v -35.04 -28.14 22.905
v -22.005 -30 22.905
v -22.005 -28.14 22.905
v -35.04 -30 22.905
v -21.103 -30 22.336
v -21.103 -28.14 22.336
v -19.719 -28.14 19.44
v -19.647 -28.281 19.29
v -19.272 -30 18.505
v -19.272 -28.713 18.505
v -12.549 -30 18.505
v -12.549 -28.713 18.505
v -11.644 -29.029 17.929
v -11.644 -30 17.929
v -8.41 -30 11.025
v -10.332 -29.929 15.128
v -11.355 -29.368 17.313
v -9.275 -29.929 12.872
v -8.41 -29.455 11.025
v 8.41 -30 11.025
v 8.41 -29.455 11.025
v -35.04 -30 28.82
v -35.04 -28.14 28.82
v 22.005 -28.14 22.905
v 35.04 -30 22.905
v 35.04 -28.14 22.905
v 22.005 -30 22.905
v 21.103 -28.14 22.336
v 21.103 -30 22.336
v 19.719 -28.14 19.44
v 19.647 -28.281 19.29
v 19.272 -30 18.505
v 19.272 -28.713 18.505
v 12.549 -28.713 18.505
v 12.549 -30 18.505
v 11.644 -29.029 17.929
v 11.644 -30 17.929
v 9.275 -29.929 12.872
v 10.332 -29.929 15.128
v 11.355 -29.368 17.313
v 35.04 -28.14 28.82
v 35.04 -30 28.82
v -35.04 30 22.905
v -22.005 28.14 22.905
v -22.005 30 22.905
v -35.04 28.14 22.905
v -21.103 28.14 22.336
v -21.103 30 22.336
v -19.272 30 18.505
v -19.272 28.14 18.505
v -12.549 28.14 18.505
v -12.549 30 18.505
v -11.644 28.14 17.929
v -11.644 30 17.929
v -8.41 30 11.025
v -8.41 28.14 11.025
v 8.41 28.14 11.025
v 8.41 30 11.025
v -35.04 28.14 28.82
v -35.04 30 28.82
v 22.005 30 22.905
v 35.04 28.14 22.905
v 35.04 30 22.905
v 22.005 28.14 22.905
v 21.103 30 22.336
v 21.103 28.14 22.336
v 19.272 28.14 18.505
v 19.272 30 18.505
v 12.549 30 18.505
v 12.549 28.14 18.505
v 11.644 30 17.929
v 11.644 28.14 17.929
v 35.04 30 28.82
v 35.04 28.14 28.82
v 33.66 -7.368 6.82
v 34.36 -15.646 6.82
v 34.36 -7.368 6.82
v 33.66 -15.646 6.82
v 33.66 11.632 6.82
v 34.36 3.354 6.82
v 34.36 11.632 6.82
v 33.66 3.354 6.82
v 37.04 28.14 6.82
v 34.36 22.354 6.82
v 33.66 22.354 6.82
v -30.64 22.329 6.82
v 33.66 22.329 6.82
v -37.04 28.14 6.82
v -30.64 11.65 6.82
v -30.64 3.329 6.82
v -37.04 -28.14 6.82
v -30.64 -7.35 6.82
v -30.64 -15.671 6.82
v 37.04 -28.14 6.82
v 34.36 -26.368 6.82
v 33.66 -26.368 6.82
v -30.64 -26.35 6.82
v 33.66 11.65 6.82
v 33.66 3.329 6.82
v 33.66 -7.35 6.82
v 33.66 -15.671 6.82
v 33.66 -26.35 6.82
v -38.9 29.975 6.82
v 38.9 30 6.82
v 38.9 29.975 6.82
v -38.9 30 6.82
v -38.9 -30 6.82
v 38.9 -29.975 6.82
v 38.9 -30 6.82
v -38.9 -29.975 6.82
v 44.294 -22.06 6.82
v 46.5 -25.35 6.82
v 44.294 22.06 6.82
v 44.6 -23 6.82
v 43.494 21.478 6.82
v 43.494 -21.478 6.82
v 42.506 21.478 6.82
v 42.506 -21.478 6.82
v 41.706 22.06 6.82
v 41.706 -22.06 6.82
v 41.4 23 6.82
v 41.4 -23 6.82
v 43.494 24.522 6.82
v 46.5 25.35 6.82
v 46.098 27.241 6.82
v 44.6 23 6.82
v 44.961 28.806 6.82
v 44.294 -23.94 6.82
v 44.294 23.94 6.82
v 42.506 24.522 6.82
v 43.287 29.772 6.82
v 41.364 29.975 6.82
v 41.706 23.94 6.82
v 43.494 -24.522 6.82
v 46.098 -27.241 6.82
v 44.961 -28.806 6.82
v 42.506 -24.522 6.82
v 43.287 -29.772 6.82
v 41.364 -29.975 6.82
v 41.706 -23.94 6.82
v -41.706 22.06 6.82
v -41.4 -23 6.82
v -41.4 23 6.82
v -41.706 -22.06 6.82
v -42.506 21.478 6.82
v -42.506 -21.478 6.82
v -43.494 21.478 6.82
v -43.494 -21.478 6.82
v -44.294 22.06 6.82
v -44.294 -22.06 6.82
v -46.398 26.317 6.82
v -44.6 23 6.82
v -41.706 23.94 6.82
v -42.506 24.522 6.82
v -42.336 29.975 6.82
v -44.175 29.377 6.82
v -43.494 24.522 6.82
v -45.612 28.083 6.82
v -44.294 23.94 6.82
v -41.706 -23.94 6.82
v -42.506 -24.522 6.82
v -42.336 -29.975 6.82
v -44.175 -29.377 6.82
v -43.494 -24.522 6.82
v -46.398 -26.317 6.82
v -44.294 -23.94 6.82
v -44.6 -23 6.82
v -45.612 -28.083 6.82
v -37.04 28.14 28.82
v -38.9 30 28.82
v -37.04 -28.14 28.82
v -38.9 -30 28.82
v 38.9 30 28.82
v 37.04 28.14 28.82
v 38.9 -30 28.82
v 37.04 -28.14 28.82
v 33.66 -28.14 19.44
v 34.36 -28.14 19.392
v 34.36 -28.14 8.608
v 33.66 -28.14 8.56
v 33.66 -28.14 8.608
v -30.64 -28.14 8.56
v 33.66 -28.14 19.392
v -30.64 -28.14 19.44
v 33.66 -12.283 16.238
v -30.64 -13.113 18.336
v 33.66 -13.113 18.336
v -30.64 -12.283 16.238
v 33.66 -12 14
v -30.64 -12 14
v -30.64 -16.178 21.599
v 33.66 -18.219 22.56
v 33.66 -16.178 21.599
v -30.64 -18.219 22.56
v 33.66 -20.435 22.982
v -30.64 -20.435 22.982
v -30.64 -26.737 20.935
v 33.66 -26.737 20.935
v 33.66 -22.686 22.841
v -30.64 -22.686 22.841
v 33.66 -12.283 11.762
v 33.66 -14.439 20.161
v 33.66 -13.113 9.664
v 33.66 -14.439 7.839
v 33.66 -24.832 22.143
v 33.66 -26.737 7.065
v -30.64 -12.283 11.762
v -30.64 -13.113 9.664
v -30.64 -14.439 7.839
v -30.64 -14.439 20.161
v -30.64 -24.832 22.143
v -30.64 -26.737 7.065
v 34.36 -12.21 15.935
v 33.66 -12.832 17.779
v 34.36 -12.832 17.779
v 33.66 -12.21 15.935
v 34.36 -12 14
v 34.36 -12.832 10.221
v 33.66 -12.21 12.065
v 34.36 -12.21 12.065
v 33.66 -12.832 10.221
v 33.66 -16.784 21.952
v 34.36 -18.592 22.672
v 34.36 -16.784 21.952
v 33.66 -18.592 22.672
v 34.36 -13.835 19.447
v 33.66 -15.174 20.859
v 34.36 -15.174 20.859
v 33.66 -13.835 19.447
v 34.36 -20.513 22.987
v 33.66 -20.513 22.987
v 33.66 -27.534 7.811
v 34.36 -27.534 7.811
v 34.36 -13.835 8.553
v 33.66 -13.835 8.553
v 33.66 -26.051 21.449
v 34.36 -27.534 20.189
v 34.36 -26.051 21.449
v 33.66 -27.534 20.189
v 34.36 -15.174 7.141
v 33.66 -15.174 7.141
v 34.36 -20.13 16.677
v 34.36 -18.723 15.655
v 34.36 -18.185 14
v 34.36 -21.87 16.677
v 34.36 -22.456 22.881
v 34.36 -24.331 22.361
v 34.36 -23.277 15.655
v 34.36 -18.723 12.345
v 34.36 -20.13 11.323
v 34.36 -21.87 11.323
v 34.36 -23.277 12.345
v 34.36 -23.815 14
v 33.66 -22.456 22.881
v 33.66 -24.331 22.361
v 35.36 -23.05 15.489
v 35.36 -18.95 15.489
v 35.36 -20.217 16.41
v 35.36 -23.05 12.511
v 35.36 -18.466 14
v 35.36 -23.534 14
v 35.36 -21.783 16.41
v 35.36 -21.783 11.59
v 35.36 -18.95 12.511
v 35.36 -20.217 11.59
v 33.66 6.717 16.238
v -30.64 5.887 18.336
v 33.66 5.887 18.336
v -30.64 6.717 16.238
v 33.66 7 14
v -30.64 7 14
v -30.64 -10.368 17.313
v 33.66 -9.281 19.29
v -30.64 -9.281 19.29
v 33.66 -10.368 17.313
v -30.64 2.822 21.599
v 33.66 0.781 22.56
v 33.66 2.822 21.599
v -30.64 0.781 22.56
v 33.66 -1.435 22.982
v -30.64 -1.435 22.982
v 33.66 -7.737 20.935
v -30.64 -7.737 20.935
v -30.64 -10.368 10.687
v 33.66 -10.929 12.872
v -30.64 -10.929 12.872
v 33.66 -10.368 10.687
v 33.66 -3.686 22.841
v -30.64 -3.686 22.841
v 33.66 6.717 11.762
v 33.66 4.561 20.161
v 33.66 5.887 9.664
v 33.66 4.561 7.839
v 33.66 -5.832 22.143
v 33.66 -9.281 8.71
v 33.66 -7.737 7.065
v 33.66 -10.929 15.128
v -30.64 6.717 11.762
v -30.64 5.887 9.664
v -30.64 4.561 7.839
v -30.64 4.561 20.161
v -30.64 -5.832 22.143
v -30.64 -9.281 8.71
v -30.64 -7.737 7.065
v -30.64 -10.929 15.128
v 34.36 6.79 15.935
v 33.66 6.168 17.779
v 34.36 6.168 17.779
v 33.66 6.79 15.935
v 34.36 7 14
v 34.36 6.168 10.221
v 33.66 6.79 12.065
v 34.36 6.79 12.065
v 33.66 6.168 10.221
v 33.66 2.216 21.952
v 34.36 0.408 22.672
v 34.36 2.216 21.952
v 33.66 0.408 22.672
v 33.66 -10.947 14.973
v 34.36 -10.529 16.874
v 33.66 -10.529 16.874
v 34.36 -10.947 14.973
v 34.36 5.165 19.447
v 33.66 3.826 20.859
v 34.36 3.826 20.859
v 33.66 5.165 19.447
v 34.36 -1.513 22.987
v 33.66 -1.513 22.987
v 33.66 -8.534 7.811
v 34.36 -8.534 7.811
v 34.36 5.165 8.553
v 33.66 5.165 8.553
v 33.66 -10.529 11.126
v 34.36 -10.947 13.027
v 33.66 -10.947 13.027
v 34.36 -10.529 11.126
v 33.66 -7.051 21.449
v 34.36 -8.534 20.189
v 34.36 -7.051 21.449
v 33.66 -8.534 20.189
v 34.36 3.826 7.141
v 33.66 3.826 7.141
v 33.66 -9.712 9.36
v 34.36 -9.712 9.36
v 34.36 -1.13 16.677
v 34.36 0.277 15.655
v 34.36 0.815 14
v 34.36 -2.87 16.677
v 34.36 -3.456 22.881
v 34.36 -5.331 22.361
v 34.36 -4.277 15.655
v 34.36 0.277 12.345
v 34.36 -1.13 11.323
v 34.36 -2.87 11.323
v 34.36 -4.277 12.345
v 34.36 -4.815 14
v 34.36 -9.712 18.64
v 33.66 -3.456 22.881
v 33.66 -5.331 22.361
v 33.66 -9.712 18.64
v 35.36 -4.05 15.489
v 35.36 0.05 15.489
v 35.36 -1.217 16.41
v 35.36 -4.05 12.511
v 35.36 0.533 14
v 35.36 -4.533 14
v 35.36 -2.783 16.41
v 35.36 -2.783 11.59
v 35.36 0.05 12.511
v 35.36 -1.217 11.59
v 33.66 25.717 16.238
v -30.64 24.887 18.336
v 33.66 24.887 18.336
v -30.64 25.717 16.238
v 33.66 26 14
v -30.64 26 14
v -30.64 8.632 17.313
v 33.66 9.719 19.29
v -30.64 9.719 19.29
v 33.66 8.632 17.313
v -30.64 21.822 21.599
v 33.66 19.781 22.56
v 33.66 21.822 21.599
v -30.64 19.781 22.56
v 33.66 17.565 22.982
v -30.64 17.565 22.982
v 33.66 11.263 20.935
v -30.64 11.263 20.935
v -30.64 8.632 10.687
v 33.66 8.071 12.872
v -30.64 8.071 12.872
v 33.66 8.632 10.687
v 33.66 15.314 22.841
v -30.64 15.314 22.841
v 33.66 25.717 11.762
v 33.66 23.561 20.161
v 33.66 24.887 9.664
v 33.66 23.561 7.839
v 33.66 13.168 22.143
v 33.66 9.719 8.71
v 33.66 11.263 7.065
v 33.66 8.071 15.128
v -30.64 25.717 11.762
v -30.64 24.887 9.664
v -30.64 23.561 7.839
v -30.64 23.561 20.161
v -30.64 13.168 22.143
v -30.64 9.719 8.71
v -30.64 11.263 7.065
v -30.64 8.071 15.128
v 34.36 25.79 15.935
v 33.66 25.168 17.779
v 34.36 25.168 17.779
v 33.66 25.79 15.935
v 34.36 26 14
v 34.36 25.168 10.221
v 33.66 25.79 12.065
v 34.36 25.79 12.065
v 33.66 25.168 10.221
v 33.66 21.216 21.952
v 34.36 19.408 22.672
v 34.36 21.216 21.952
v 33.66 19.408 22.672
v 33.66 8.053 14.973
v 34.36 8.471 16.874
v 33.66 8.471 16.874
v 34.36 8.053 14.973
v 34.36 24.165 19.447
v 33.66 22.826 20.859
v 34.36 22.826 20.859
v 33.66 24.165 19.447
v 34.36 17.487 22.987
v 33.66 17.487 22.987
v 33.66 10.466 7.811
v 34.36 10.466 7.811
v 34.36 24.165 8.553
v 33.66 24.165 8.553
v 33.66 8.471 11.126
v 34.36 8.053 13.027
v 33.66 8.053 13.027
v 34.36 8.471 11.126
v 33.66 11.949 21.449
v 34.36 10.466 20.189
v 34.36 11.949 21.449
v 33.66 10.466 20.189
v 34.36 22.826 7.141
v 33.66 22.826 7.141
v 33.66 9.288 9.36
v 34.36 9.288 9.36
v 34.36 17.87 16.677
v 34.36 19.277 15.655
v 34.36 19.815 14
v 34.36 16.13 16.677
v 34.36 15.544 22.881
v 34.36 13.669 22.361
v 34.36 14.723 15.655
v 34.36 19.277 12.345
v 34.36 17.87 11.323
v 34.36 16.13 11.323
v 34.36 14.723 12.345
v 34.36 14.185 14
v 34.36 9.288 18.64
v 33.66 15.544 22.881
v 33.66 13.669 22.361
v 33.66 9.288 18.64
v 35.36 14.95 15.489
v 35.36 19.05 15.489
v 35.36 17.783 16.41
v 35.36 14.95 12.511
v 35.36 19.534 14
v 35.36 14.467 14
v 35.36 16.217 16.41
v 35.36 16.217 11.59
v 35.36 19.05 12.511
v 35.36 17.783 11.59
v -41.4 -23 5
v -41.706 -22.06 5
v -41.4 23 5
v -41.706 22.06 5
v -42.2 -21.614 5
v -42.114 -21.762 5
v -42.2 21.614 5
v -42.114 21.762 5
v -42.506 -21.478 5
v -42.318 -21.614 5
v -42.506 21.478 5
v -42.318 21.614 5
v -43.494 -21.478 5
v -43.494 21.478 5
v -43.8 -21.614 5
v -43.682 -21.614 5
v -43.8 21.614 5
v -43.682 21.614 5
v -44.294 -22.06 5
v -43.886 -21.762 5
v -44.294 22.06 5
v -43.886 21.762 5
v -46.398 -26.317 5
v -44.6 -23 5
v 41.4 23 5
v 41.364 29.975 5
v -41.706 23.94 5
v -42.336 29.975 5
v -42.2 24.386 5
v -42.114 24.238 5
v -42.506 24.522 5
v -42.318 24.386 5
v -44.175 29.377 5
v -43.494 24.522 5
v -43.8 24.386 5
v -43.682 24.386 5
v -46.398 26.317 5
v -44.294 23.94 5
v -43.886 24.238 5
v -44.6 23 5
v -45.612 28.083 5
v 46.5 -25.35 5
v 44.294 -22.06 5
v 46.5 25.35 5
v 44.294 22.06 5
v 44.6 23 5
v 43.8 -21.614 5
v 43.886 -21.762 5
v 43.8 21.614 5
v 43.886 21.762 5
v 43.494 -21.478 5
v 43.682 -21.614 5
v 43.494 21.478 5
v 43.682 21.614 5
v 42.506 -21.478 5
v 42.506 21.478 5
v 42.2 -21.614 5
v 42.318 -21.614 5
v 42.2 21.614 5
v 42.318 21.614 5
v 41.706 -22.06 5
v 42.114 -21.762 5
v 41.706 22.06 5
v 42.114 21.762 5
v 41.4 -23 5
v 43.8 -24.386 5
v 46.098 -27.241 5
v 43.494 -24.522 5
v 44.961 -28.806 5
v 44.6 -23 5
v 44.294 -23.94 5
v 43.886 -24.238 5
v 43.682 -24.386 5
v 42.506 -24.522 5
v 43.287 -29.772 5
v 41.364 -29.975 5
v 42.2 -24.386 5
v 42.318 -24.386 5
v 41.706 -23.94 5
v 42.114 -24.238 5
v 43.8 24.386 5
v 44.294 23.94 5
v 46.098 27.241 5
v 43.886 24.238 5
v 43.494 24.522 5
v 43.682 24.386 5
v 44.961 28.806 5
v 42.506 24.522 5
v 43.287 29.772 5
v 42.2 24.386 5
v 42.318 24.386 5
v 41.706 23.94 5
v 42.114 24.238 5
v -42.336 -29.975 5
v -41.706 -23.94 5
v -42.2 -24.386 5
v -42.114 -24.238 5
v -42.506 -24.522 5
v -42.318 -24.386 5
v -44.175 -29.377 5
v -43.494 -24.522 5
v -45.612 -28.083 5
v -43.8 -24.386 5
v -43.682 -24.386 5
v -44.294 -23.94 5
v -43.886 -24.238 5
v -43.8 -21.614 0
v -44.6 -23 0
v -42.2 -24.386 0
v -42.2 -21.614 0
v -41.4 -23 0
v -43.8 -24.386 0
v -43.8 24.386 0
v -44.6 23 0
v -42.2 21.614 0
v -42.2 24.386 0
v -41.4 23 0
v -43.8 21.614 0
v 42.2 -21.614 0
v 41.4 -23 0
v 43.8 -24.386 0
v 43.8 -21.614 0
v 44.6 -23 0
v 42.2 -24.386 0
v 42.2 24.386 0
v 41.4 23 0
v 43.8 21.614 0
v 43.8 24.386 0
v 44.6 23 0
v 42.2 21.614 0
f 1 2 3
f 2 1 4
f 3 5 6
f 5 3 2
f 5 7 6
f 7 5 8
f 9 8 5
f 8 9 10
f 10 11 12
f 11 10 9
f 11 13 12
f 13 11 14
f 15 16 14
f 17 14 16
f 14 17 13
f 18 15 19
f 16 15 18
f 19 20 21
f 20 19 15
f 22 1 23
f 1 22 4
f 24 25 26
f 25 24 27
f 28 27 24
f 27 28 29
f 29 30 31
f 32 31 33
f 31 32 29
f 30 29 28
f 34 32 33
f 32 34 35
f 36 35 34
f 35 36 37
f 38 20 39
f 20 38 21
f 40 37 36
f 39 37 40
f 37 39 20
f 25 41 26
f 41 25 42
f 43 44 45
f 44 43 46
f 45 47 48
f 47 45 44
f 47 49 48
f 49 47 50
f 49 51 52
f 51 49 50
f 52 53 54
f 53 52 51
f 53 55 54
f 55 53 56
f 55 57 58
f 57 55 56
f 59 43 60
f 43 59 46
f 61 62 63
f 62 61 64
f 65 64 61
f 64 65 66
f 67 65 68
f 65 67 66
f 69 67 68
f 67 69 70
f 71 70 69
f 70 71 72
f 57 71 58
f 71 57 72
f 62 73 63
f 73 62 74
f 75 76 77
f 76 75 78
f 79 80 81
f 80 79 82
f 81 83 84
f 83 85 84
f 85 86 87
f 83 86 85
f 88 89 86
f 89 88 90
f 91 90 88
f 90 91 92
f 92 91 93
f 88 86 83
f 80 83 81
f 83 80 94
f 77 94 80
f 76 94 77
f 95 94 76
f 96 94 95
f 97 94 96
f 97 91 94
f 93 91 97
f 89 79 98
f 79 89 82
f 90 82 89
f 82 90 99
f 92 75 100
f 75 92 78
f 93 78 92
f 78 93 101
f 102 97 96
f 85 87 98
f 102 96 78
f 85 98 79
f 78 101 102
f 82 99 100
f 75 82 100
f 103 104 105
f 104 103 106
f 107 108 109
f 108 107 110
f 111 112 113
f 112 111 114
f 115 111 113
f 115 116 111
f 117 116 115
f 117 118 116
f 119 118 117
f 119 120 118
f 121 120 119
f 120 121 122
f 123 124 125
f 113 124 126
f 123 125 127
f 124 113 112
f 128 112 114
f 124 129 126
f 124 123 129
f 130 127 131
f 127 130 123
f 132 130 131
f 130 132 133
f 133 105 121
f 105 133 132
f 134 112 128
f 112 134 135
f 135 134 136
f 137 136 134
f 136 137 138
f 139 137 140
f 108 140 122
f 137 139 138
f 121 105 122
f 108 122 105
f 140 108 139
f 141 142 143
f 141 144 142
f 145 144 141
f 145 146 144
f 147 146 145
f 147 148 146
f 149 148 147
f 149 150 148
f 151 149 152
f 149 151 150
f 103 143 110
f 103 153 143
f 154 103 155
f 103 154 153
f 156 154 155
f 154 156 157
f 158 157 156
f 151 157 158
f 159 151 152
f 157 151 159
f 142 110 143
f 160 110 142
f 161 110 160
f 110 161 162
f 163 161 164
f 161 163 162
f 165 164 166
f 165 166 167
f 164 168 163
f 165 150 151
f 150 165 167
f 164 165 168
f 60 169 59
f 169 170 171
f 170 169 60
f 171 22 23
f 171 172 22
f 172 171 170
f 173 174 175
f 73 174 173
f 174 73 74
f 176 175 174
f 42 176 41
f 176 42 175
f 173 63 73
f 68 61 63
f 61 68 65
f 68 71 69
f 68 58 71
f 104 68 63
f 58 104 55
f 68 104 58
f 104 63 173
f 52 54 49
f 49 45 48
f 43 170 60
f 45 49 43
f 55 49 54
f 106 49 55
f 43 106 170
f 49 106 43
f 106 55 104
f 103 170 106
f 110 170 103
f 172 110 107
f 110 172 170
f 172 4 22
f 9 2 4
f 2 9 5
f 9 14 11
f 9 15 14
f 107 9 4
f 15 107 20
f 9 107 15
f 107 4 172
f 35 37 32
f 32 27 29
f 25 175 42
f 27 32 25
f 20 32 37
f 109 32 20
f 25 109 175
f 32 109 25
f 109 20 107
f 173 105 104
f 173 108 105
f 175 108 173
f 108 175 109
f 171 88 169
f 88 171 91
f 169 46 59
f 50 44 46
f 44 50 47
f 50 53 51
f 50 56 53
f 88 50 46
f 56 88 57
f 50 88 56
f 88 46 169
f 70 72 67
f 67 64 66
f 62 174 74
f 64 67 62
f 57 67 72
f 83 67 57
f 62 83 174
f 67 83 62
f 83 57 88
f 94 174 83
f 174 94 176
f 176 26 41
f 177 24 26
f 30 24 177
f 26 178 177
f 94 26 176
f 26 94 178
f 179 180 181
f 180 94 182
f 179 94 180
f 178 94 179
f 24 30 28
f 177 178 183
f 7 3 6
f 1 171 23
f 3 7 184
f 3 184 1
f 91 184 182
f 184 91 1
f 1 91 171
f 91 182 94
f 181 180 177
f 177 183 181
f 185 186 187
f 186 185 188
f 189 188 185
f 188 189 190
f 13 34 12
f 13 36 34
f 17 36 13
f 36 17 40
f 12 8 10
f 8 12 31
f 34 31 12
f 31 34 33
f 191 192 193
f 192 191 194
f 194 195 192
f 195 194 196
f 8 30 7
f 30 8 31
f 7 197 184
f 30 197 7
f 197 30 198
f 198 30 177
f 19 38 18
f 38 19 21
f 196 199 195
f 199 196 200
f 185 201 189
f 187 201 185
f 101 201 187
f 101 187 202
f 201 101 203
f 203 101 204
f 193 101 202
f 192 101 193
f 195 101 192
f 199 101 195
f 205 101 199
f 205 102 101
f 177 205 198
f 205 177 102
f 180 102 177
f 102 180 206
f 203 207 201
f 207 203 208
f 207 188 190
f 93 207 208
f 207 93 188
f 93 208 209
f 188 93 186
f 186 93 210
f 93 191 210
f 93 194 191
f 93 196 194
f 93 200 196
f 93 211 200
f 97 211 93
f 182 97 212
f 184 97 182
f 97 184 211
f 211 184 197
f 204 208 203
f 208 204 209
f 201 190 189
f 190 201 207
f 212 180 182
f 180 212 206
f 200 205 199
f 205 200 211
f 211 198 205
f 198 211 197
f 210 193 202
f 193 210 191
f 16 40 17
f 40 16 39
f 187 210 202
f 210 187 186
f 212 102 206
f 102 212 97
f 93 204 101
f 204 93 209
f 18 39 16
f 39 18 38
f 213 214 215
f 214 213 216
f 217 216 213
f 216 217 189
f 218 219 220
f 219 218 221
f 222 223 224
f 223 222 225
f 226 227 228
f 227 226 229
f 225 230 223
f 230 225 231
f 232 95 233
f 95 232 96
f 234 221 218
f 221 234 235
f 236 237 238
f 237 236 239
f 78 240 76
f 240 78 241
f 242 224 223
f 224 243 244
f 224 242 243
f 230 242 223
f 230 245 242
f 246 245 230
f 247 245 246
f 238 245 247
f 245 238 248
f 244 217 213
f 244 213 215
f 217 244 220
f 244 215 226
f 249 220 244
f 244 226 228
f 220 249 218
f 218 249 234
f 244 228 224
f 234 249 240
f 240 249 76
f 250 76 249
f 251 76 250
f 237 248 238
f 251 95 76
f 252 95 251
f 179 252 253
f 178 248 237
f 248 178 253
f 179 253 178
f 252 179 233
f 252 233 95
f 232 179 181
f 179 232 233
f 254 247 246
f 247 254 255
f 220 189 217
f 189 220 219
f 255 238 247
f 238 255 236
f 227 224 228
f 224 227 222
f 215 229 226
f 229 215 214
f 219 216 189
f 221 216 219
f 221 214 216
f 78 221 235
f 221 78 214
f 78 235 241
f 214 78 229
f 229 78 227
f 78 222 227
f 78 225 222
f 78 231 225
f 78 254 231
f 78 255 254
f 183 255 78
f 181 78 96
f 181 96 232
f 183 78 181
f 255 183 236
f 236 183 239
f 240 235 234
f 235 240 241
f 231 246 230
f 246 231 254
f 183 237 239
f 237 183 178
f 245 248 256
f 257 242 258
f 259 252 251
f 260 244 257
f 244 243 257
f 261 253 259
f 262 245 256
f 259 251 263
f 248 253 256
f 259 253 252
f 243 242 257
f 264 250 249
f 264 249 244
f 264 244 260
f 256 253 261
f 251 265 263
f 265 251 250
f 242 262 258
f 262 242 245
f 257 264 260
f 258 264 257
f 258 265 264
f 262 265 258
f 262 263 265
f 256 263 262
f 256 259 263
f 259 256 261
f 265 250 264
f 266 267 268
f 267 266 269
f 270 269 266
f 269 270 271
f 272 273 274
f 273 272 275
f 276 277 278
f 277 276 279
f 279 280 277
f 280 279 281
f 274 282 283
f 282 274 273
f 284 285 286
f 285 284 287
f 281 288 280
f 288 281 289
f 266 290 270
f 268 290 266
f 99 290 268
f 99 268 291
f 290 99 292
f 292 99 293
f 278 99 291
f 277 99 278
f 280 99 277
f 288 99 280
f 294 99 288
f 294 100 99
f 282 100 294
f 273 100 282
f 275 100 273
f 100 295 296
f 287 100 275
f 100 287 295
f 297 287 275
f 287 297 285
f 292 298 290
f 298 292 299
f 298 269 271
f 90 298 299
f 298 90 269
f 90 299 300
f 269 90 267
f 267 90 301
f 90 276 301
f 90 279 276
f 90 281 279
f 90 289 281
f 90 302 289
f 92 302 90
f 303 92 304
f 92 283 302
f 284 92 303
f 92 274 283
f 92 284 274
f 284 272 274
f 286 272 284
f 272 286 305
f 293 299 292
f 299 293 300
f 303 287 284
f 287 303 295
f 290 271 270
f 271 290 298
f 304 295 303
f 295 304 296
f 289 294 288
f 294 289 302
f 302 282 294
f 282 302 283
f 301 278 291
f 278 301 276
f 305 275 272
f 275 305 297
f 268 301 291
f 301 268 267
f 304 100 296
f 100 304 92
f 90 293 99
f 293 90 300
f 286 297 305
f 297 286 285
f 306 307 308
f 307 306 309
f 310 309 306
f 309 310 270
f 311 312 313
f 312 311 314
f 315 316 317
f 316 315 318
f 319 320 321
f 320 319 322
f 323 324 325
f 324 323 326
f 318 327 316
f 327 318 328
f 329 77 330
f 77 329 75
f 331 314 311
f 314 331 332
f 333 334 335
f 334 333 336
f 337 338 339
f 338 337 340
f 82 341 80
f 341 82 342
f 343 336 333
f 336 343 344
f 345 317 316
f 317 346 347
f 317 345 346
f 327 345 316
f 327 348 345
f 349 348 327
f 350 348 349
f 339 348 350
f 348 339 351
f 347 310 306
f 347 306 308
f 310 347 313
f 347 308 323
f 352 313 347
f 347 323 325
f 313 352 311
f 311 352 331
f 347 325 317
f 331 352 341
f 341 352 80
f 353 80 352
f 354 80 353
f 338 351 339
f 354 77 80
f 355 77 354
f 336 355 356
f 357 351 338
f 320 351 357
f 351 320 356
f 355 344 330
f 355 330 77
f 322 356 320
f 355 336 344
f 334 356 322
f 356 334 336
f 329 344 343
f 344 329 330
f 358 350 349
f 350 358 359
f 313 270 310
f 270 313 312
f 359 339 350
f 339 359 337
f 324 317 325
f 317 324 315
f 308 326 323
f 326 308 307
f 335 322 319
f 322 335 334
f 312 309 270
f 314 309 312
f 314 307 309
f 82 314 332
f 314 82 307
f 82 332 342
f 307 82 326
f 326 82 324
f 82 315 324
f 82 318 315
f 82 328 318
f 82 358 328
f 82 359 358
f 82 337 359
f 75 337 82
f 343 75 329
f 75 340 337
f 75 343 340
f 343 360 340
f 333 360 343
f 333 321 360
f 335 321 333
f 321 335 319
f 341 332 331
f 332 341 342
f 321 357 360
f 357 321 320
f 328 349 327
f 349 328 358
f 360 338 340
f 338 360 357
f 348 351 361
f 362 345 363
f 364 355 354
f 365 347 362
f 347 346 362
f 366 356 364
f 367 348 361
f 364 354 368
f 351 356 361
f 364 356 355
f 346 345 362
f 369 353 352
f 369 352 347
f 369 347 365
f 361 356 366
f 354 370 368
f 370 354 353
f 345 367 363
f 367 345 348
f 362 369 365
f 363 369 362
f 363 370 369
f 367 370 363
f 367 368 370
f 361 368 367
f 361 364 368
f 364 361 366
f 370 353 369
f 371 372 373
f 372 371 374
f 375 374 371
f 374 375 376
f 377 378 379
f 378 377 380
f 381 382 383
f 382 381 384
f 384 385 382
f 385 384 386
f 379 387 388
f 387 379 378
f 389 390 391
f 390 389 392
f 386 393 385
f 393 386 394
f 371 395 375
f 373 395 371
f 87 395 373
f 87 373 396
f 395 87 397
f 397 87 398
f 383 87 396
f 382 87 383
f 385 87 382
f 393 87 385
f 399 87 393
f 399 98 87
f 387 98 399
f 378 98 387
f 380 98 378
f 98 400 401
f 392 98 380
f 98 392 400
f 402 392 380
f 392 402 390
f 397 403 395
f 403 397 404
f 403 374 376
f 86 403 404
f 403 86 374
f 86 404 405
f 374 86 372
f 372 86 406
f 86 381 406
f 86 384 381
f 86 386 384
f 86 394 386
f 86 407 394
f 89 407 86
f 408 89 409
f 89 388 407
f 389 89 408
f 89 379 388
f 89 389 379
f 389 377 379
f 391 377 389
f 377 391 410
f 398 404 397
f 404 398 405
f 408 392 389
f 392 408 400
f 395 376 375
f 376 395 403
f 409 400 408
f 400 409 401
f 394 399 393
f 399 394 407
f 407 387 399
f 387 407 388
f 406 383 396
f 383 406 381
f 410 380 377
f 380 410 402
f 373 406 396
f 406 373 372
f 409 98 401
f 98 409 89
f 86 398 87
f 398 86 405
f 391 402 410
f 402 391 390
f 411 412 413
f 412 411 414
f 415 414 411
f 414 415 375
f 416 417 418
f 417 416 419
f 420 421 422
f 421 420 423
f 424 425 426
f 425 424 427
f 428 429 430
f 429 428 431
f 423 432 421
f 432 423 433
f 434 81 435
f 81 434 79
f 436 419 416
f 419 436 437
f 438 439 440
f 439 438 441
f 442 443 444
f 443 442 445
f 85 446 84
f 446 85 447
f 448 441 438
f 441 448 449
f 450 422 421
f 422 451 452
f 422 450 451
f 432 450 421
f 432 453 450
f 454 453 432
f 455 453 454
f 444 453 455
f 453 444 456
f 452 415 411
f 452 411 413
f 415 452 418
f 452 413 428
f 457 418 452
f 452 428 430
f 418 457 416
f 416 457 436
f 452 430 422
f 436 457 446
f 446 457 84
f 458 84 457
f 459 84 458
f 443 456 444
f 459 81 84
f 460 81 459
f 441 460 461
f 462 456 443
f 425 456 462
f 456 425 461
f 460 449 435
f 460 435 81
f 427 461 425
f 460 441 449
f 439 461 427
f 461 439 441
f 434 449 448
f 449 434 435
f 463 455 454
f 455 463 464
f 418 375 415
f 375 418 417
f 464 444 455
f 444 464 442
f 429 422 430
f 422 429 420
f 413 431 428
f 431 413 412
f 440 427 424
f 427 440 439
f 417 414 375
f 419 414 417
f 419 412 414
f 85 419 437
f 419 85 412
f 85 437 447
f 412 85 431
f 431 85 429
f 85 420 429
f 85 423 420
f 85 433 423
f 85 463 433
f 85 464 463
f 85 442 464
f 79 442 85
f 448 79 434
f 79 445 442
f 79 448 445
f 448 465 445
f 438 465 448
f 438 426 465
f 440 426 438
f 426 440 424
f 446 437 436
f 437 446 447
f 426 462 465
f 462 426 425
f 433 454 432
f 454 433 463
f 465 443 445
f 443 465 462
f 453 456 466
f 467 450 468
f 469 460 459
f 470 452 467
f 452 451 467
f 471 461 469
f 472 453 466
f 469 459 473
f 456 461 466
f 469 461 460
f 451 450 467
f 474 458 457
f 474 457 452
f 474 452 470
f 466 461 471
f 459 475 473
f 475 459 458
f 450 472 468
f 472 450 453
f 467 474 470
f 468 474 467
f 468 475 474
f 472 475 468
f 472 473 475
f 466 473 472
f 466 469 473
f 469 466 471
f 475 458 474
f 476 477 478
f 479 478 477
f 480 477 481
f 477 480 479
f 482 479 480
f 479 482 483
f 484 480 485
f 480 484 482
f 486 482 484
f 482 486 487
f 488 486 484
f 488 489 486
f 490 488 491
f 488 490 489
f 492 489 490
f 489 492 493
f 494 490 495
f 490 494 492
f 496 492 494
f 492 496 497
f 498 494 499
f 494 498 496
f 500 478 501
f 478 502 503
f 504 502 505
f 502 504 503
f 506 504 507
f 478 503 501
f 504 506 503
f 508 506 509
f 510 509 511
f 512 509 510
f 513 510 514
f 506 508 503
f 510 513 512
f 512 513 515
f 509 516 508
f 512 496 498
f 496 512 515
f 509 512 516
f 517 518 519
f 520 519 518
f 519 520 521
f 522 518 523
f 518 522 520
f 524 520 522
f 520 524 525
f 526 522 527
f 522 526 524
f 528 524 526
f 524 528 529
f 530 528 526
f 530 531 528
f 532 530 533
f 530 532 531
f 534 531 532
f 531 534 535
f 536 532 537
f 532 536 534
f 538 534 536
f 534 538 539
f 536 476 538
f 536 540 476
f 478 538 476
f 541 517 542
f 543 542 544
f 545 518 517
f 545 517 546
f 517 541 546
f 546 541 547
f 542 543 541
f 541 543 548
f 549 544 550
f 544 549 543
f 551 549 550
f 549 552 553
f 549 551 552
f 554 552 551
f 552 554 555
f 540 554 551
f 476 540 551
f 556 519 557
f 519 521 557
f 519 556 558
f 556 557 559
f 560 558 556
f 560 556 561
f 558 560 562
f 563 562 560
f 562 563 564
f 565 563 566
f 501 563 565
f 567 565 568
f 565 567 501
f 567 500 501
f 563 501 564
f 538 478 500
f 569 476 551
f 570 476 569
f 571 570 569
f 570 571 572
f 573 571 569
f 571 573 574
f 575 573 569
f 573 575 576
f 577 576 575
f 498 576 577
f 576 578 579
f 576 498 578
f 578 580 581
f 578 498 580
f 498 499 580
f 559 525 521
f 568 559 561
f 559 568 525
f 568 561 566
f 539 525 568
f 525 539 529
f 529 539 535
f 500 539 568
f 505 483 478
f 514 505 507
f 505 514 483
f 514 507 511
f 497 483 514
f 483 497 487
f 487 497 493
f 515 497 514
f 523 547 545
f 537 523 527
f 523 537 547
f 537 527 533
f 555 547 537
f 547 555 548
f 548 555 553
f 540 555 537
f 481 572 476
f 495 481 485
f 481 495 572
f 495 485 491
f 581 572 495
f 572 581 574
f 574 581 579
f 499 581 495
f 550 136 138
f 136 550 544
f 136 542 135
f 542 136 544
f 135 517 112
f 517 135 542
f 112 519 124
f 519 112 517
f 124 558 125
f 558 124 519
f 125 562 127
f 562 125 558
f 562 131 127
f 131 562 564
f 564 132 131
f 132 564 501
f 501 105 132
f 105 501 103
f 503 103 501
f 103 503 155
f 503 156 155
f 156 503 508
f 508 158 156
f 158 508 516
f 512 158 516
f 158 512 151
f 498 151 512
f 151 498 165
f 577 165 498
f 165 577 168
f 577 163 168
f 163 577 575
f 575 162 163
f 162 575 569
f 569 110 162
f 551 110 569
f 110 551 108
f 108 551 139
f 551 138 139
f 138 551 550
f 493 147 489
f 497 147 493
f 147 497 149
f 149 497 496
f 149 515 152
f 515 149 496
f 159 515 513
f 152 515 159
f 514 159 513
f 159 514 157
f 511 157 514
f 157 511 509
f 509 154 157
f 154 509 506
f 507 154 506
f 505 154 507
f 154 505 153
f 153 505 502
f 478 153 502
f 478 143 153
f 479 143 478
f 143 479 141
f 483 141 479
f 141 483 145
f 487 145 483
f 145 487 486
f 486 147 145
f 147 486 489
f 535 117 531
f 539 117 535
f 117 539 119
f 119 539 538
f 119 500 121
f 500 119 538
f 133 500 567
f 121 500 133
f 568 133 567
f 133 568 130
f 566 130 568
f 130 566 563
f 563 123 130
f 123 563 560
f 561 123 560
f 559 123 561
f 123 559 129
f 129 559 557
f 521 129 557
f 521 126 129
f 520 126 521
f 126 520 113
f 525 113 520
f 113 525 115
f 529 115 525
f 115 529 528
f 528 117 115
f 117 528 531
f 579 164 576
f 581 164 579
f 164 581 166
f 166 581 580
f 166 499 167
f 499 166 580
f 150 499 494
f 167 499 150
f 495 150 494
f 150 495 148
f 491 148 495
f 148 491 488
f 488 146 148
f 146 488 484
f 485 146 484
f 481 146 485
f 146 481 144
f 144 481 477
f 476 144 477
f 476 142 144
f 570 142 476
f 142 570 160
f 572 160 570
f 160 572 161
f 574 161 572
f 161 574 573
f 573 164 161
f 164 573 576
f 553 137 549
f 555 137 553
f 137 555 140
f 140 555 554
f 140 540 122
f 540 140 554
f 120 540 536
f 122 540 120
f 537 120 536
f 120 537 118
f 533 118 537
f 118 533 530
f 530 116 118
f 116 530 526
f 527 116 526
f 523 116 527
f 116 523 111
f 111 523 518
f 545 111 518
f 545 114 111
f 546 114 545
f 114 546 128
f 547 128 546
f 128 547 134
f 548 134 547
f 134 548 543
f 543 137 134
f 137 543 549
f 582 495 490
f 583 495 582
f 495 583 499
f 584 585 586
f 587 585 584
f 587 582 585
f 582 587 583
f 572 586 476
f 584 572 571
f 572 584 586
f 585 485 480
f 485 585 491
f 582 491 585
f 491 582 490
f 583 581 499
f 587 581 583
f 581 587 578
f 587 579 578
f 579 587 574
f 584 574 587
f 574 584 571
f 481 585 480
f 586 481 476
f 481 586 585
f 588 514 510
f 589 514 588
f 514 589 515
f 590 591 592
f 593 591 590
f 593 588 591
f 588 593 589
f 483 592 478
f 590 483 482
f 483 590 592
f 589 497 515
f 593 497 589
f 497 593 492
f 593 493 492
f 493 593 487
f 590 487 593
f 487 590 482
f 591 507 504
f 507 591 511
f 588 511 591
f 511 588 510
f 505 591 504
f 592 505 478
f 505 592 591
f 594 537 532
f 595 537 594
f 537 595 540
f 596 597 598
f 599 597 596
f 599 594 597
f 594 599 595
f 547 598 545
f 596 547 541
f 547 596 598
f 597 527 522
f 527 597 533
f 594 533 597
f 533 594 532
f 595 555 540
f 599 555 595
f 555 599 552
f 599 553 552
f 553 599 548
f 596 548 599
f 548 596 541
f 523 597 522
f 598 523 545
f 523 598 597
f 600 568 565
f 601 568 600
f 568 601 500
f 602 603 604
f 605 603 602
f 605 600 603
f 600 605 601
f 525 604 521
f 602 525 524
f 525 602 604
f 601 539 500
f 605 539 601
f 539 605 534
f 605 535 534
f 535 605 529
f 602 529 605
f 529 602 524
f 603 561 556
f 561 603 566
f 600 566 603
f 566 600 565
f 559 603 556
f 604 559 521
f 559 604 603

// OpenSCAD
/**
 * Module: Uninterruptible Power Supply Module 3S
 * https://www.waveshare.com/ups-module-3s.htm
 *
 * Author: Karim Aziiev <karim.aziiev@gmail.com>
 * License: GPL-3.0-or-later
 */
include <../colors.scad>
include <../parameters.scad>

use <../lib/shapes2d.scad>
use <../lib/transforms.scad>
use <battery.scad>

function ups_hat_polygon_cutout_points(max_len, max_height) =
  let (end_x = max_len / 2,
       end_y = max_height)
  [[0, 0],
   [0, end_y],
   [0.24 * end_x, end_y],
   [0.34 * end_x, 0.66 * end_y],
   [0.55 * end_x, 0.66 * end_y],
   [0.61 * end_x, 0.46 * end_y],
   [end_x, 0.46 * end_y],
   [end_x, 0]];

module ups_hat(size=battery_ups_size,
               holder_size=battery_ups_holder_size,
               holder_thickness=battery_ups_holder_thickness,
               bolt_dia=battery_ups_bolt_dia,
               standoff_h=5,
               max_cutout_len,
               max_cutout_height,
               center=true) {
  total_len = size[0];
  total_w = size[1];
  plate_h = size[2];
  holder_len = holder_size[0];
  holder_w = holder_size[1];
  holder_h = holder_size[2];
  double_thickness = holder_thickness * 2;
  holder_size = [holder_len - double_thickness, holder_w - double_thickness];
  battery_step = 1 + battery_dia;
  batteries_amount = round(holder_size[1] / battery_step);
  max_cutout_len = is_undef(max_cutout_len)
                   ? holder_len - double_thickness - 4
                   : max_cutout_len;
  max_cutout_height = is_undef(max_cutout_height)
                      ? holder_h
                      : max_cutout_height;
  cutout_thickness = holder_thickness + 2;
  points = ups_hat_polygon_cutout_points(max_len=max_cutout_len,
                                         max_height=max_cutout_height);

  lowest_height = min([for (pair = points) if (pair[0] != 0) pair[0]]);

  translate([center ? -total_len / 2 : 0, center ? -total_w / 2 : 0, 0]) {
    translate([0, 0, standoff_h]) {
      union() {
        color(black_1, alpha=1) {
          linear_extrude(height=plate_h, center=false) {
            difference() {
              rounded_rect([total_len, total_w],
                           r=total_len * 0.05,
                           center=false);
              translate([(total_len - battery_ups_module_bolt_spacing[0]) / 2,
                         (total_w - battery_ups_module_bolt_spacing[1]) / 2,
                         0]) {
                four_corner_holes_2d(size=battery_ups_module_bolt_spacing,
                                     center=false,
                                     d=bolt_dia,
                                     fn=10);
              }
            }
          }
        }
        difference() {
          translate([(total_len - holder_len) / 2,
                     (total_w - holder_w) / 2,
                     plate_h]) {
            color(matte_black, alpha=1) {
              linear_extrude(height=holder_h,
                             center=false,
                             convexity=2) {
                difference() {
                  square([holder_len, holder_w], center=false);
                  translate([(holder_len - holder_size[0]) / 2,
                             (holder_w - holder_size[1]) / 2,
                             0]) {
                    square([holder_size[0], holder_size[1]], center=false);
                  }
                }
              }
            }
          }
          translate([(total_len) / 2,
                     holder_thickness / 2
                     + cutout_thickness / 2,
                     plate_h + holder_h + lowest_height / 2]) {
            ups_hat_wall_cutout(max_len=max_cutout_len,
                                max_height=max_cutout_height,
                                thickness=cutout_thickness,
                                points=points);

            translate([0, holder_w - cutout_thickness / 2, 0]) {
              ups_hat_wall_cutout(max_len=max_cutout_len,
                                  max_height=max_cutout_height,
                                  thickness=cutout_thickness,
                                  points=points);
            }
          }
        }
        translate([(total_len - battery_length) / 2 +
                   holder_thickness,
                   battery_dia,
                   battery_dia / 2]) {
          for (i = [0 : batteries_amount - 1]) {
            translate([0, battery_step * i - battery_dia / 2, 0]) {
              rotate([90, 0, 90]) {
                battery();
              }
            }
          }
        }
      }
    }
    color("gold", alpha=1) {
      translate([(total_len - battery_ups_module_bolt_spacing[0]) / 2,
                 (total_w - battery_ups_module_bolt_spacing[1]) / 2,
                 0]) {
        for (x_ind = [0, 1])
          for (y_ind = [0, 1]) {
            x_pos = x_ind * battery_ups_module_bolt_spacing[0];
            y_pos = y_ind * battery_ups_module_bolt_spacing[1];
            translate([x_pos, y_pos]) {
              linear_extrude(height=standoff_h, center=false) {
                circle(r=bolt_dia / 2);
              }
            }
          }
      }
    }
  }
}

module ups_hat_wall_cutout(max_len=battery_ups_holder_size[0] - 4,
                           max_height=battery_ups_holder_size[2],
                           thickness=battery_ups_holder_thickness + 1,
                           offset_rad=1,
                           points) {

  pts = is_undef(points)
        ? ups_hat_polygon_cutout_points(max_len=max_len, max_height=max_height)
        : points;
  rotate([90, 0, 0]) {
    mirror_copy([1, 0, 0]) {
      linear_extrude(height=thickness,
                     center=false) {
        rotate([0, 0, 180]) {
          fillet(r=offset_rad) {
            polygon(points=pts);
          }
        }
      }
    }
  }
}

ups_hat();
